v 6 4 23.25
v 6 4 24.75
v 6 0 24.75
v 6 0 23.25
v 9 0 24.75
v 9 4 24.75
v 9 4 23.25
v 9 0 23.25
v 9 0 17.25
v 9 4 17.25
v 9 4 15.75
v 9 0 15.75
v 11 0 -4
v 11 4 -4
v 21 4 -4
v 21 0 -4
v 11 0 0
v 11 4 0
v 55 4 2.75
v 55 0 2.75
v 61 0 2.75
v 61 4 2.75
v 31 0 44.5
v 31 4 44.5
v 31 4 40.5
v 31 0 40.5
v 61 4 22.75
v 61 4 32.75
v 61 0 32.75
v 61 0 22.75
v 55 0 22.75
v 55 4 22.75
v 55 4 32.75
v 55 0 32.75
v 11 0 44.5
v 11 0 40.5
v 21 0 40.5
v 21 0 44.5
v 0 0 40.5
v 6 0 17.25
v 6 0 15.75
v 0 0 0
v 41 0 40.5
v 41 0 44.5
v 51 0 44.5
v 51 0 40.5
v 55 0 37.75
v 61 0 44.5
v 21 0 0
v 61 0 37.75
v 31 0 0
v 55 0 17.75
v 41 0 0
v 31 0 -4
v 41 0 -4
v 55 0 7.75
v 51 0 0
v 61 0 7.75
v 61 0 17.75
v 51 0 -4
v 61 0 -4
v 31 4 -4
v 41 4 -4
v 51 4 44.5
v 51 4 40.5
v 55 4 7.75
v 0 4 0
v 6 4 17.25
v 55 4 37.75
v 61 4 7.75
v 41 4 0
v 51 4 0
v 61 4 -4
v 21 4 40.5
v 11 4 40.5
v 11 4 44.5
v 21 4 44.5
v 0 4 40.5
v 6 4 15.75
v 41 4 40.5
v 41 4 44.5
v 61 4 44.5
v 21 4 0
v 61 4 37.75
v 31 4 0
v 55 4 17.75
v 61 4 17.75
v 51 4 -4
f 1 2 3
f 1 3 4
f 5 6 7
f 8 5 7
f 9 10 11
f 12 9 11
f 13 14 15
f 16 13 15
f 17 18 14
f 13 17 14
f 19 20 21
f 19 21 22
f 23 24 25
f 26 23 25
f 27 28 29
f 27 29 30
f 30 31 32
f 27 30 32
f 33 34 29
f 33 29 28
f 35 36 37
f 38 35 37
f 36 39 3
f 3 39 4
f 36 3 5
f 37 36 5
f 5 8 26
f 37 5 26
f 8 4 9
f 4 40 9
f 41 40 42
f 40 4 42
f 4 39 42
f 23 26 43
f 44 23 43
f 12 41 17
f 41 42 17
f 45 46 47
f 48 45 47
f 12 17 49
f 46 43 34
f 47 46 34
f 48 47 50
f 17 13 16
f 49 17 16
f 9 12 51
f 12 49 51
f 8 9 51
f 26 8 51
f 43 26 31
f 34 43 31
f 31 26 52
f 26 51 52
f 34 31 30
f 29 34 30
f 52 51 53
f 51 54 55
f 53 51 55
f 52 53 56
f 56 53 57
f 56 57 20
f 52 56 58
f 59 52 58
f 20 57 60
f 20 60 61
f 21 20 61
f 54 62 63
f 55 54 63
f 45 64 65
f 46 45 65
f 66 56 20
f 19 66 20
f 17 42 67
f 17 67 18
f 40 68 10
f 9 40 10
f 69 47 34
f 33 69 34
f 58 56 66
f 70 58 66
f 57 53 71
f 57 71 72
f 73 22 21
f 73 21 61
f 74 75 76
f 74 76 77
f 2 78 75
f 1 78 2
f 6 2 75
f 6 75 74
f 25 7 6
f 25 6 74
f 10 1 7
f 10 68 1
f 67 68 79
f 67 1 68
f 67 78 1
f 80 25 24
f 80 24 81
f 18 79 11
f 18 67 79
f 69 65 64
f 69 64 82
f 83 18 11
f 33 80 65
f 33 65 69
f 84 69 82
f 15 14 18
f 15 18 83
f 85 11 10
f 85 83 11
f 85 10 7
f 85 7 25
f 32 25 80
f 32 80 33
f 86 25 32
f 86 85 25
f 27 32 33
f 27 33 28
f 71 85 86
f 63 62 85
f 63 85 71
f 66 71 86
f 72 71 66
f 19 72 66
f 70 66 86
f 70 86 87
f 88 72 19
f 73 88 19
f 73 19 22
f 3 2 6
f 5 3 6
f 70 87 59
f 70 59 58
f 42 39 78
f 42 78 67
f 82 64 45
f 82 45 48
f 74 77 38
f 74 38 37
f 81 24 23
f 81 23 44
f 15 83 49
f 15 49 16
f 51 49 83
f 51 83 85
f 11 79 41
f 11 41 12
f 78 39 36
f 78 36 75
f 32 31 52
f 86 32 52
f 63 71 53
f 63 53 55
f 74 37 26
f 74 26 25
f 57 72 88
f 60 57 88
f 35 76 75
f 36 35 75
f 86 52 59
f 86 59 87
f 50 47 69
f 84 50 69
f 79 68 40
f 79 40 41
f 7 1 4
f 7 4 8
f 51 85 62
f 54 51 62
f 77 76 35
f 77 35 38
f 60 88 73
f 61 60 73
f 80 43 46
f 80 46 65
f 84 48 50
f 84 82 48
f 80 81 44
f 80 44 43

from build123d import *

# Parameters (mm, degrees)
SKETCH1_W           = 55
SKETCH1_H           = 40.5
BOSS_EXTRUDE1_DEPTH = 4
SKETCH2_W           = 2.75
SKETCH2_H           = 4
SKETCH2_W_2         = 10
BOSS_EXTRUDE2_DEPTH = 6
SKETCH3_W           = 10
SKETCH3_H           = 4
BOSS_EXTRUDE3_DEPTH = 4
LPATTERN1_COUNT     = 3
LPATTERN1_PITCH     = 20
SKETCH4_W           = 3
SKETCH4_H           = 1.5
CUT_EXTRUDE1_DEPTH  = 5


with BuildPart() as part:
    # Sketch1 → Boss-Extrude1 (new body)
    with BuildSketch(Plane(origin=(0, 0, 0), x_dir=(1, 0, 0), z_dir=(0, 1, 0))):
        with Locations((27.5, -20.25)):
            Rectangle(SKETCH1_W, SKETCH1_H)
    extrude(amount=BOSS_EXTRUDE1_DEPTH)

    # Sketch2 → Boss-Extrude2 (add)
    with BuildSketch(Plane(origin=(55, 0, 0), x_dir=(0, 0, -1), z_dir=(1, 0, 0))):
        with Locations((-39.125, 2)):
            Rectangle(SKETCH2_W, SKETCH2_H)
        with Locations((-27.75, 2)):
            Rectangle(SKETCH2_W_2, SKETCH2_H)
        with Locations((-12.75, 2)):
            Rectangle(SKETCH2_W_2, SKETCH2_H)
        with Locations((-1.375, 2)):
            Rectangle(SKETCH2_W, SKETCH2_H)
    extrude(amount=BOSS_EXTRUDE2_DEPTH)

    # Sketch3 → Boss-Extrude3 (add, through all)
    with BuildSketch(Plane(origin=(0, 4, 0), x_dir=(1, 0, 0), z_dir=(0, 1, 0))):
        with Locations((56, 2)):
            Rectangle(SKETCH3_W, SKETCH3_H)
        with Locations((56, -42.5)):
            Rectangle(SKETCH3_W, SKETCH3_H)
    boss_extrude3 = extrude(amount=-BOSS_EXTRUDE3_DEPTH)

    # LPattern1: Boss-Extrude3 ×3
    with Locations(*[(-i * LPATTERN1_PITCH, 0, 0) for i in range(1, LPATTERN1_COUNT)]):
        add(boss_extrude3)

    # Sketch4 → Cut-Extrude1 (cut, through all)
    with BuildSketch(Plane(origin=(0, 4, 0), x_dir=(1, 0, 0), z_dir=(0, 1, 0))):
        with Locations((7.5, -24)):
            Rectangle(SKETCH4_W, SKETCH4_H)
        with Locations((7.5, -16.5)):
            Rectangle(SKETCH4_W, SKETCH4_H)
    extrude(amount=-CUT_EXTRUDE1_DEPTH, mode=Mode.SUBTRACT)


solid = part.part
